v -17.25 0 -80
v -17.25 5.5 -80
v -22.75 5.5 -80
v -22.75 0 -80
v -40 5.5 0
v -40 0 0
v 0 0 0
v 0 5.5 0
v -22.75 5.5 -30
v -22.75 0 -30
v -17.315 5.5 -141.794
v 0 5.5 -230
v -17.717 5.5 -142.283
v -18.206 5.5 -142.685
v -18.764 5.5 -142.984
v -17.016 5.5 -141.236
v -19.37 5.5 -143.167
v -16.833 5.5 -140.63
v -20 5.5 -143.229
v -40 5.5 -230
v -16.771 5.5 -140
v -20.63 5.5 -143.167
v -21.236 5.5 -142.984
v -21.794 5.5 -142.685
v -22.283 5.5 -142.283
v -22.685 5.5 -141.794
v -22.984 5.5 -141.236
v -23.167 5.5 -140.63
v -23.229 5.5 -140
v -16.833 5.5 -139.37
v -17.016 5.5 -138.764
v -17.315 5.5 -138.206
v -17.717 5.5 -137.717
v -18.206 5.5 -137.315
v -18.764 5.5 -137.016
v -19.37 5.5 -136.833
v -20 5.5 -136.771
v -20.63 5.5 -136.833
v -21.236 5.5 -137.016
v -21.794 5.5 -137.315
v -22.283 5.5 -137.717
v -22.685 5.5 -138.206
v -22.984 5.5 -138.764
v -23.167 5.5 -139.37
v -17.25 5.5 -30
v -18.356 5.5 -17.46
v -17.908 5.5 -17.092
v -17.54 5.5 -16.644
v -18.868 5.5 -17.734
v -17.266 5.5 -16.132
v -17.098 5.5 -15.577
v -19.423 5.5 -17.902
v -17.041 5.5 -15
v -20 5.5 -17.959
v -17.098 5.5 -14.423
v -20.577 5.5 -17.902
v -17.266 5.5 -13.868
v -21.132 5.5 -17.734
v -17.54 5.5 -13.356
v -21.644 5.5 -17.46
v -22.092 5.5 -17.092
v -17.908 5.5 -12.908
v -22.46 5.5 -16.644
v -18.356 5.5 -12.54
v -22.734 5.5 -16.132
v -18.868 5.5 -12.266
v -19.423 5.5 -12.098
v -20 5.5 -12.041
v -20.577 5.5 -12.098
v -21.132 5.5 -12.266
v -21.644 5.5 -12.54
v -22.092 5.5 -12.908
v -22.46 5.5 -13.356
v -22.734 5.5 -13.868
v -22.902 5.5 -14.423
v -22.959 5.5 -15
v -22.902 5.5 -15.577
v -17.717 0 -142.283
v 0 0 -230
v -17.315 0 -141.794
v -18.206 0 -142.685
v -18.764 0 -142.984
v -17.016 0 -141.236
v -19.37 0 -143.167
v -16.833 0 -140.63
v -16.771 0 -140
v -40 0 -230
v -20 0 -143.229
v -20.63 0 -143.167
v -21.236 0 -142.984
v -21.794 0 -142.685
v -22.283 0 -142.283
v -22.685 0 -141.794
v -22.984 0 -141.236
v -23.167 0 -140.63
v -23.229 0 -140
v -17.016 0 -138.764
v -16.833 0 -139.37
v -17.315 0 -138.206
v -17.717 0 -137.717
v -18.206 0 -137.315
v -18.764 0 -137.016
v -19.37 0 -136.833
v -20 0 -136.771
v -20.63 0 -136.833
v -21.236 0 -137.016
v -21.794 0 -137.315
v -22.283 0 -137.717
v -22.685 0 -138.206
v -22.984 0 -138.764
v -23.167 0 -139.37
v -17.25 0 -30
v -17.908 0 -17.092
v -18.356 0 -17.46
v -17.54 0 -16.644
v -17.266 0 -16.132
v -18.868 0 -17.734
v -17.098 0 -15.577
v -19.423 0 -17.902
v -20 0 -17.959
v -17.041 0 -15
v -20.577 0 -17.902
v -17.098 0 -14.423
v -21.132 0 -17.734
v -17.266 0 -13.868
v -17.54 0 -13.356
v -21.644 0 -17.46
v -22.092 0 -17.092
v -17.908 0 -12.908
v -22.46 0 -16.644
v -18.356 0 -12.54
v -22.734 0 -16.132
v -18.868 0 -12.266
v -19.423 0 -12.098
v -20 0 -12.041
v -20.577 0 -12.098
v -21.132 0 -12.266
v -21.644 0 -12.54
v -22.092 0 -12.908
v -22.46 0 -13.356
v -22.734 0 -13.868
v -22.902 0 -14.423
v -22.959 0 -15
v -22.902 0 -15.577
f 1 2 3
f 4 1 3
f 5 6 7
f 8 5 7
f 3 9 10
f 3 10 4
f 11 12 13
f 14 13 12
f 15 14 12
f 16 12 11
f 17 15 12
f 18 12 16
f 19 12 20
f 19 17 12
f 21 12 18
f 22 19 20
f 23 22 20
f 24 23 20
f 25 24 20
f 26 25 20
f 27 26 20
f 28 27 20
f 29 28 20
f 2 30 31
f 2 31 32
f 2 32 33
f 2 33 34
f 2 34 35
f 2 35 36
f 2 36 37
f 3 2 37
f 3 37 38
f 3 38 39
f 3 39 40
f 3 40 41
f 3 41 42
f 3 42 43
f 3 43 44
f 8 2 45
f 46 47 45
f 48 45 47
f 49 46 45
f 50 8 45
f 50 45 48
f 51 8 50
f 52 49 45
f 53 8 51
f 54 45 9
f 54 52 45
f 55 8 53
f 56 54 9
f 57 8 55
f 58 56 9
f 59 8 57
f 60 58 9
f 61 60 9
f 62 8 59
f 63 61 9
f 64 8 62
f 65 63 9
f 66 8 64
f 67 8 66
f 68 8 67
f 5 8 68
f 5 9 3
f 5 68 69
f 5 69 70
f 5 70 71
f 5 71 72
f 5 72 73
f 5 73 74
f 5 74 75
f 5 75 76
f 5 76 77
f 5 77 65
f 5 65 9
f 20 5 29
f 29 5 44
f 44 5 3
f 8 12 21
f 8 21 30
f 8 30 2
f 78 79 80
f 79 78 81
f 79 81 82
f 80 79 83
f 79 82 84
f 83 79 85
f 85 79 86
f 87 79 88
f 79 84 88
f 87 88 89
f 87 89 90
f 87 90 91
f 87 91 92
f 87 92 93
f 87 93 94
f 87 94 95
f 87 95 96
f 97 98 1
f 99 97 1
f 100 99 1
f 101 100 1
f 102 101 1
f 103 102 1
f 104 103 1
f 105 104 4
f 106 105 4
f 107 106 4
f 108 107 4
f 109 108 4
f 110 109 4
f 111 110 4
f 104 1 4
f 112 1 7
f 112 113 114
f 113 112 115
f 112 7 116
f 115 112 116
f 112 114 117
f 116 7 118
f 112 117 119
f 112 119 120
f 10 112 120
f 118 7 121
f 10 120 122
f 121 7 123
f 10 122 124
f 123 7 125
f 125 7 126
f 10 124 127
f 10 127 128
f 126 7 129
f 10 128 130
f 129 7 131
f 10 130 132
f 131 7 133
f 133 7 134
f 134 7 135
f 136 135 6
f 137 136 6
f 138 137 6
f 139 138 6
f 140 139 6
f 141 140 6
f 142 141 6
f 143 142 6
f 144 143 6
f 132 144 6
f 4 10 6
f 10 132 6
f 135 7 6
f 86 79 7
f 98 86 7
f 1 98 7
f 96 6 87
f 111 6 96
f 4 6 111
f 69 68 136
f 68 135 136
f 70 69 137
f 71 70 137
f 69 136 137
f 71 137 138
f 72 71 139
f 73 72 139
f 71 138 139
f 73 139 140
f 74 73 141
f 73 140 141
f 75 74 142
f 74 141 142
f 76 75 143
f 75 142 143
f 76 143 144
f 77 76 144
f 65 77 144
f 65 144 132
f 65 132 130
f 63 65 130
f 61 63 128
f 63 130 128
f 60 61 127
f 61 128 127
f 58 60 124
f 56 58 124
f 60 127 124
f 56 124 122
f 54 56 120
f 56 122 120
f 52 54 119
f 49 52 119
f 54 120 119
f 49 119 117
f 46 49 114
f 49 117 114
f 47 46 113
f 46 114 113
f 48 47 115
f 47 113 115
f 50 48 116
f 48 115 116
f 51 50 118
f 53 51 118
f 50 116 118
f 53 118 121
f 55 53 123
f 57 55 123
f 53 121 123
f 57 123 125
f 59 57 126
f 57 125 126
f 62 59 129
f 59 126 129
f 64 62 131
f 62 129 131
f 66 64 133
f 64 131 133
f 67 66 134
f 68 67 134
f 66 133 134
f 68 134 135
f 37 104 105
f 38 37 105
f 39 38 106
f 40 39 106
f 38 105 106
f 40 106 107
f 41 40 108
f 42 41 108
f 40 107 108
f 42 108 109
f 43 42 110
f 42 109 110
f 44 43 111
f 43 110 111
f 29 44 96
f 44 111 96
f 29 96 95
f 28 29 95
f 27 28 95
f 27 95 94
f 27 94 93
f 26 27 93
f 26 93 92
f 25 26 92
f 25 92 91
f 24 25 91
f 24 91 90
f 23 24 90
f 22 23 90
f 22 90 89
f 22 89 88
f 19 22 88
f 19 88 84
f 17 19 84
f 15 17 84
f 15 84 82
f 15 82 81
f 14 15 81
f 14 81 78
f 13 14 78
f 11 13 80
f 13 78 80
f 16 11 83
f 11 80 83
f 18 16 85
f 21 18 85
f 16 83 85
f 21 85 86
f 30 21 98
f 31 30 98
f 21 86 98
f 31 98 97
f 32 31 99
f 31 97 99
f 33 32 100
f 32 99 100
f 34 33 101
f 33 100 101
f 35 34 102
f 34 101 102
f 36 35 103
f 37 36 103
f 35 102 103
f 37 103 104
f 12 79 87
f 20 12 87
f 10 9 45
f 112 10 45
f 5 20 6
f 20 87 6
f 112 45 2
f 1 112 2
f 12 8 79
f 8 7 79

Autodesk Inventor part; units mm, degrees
ref_plane "YZ Plane" through (0, 0, 0) normal (1, 0, 0) x (0, 1, 0)
ref_plane "XZ Plane" through (0, 0, 0) normal (0, 1, 0) x (-1, 0, 0)
ref_plane "XY Plane" through (0, 0, 0) normal (0, 0, 1) x (1, 0, 0)
sketch "Sketch1" plane through (0, 0, 0) normal (0, 1, 0) x (-1, 0, 0)
  line L0 (0, 0) -> (0, -230)
  line L1 (0, -230) -> (40, -230)
  line L2 (40, -230) -> (40, 0)
  line L3 (40, 0) -> (0, 0)
  dimension "d0" = 230
  dimension "d1" = 40
extrude "Extrusion1" add sketch "Sketch1" along normal blind 5.5
sketch "Sketch2" plane through (0, 5.5, 0) normal (0, 1, 0) x (1, 0, 0)
  line L0 (-40, 0) -> (0, 0) construction
  line L1 (-20, 0) -> (-20, 30) construction
  line L2 (-20, 30) -> (-22.75, 30)
  line L3 (-40, 230) -> (-40, 0) construction
  line L4 (-22.75, 30) -> (-22.75, 80)
  line L5 (-22.75, 80) -> (-20, 80)
  line L6 (-20, 30) -> (-17.25, 30)
  line L7 (-17.25, 30) -> (-17.25, 80)
  line L8 (-17.25, 80) -> (-20, 80)
  dimension "d4" = 30
  dimension "d5" = 2.75
  dimension "d6" = 50
extrude "Extrusion2" cut sketch "Sketch2" against normal blind 5.5
sketch "Sketch3" plane through (0, 5.5, 0) normal (0, 1, 0) x (1, 0, 0)
  line L0 (-40, 0) -> (0, 0) construction
  line L1 (-20, 0) -> (-20, 15) construction
  dimension "d9" = 15
hole "Hole1" at (-20, 5.5, -15) direction (0, -1, 0) diameter 5.9175 depth 19.1 tip angle 118 thread size "M7x1" class "6H" standard "ANSI Metric M Profile"
sketch "Sketch4" plane through (0, 5.5, 0) normal (0, 1, 0) x (1, 0, 0)
  line L0 (0, 230) -> (-40, 230) construction
  line L1 (-20, 230) -> (-20, 140) construction
  point P0 (0, 0)
  dimension "d17" = 90
hole "Hole2" at (-20, 5.5, -140) direction (0, -1, 0) diameter 6.4587 depth 19.1 tip angle 118 thread size "M7x0.5" class "6H" standard "ANSI Metric M Profile"
properties part number "LMK"
